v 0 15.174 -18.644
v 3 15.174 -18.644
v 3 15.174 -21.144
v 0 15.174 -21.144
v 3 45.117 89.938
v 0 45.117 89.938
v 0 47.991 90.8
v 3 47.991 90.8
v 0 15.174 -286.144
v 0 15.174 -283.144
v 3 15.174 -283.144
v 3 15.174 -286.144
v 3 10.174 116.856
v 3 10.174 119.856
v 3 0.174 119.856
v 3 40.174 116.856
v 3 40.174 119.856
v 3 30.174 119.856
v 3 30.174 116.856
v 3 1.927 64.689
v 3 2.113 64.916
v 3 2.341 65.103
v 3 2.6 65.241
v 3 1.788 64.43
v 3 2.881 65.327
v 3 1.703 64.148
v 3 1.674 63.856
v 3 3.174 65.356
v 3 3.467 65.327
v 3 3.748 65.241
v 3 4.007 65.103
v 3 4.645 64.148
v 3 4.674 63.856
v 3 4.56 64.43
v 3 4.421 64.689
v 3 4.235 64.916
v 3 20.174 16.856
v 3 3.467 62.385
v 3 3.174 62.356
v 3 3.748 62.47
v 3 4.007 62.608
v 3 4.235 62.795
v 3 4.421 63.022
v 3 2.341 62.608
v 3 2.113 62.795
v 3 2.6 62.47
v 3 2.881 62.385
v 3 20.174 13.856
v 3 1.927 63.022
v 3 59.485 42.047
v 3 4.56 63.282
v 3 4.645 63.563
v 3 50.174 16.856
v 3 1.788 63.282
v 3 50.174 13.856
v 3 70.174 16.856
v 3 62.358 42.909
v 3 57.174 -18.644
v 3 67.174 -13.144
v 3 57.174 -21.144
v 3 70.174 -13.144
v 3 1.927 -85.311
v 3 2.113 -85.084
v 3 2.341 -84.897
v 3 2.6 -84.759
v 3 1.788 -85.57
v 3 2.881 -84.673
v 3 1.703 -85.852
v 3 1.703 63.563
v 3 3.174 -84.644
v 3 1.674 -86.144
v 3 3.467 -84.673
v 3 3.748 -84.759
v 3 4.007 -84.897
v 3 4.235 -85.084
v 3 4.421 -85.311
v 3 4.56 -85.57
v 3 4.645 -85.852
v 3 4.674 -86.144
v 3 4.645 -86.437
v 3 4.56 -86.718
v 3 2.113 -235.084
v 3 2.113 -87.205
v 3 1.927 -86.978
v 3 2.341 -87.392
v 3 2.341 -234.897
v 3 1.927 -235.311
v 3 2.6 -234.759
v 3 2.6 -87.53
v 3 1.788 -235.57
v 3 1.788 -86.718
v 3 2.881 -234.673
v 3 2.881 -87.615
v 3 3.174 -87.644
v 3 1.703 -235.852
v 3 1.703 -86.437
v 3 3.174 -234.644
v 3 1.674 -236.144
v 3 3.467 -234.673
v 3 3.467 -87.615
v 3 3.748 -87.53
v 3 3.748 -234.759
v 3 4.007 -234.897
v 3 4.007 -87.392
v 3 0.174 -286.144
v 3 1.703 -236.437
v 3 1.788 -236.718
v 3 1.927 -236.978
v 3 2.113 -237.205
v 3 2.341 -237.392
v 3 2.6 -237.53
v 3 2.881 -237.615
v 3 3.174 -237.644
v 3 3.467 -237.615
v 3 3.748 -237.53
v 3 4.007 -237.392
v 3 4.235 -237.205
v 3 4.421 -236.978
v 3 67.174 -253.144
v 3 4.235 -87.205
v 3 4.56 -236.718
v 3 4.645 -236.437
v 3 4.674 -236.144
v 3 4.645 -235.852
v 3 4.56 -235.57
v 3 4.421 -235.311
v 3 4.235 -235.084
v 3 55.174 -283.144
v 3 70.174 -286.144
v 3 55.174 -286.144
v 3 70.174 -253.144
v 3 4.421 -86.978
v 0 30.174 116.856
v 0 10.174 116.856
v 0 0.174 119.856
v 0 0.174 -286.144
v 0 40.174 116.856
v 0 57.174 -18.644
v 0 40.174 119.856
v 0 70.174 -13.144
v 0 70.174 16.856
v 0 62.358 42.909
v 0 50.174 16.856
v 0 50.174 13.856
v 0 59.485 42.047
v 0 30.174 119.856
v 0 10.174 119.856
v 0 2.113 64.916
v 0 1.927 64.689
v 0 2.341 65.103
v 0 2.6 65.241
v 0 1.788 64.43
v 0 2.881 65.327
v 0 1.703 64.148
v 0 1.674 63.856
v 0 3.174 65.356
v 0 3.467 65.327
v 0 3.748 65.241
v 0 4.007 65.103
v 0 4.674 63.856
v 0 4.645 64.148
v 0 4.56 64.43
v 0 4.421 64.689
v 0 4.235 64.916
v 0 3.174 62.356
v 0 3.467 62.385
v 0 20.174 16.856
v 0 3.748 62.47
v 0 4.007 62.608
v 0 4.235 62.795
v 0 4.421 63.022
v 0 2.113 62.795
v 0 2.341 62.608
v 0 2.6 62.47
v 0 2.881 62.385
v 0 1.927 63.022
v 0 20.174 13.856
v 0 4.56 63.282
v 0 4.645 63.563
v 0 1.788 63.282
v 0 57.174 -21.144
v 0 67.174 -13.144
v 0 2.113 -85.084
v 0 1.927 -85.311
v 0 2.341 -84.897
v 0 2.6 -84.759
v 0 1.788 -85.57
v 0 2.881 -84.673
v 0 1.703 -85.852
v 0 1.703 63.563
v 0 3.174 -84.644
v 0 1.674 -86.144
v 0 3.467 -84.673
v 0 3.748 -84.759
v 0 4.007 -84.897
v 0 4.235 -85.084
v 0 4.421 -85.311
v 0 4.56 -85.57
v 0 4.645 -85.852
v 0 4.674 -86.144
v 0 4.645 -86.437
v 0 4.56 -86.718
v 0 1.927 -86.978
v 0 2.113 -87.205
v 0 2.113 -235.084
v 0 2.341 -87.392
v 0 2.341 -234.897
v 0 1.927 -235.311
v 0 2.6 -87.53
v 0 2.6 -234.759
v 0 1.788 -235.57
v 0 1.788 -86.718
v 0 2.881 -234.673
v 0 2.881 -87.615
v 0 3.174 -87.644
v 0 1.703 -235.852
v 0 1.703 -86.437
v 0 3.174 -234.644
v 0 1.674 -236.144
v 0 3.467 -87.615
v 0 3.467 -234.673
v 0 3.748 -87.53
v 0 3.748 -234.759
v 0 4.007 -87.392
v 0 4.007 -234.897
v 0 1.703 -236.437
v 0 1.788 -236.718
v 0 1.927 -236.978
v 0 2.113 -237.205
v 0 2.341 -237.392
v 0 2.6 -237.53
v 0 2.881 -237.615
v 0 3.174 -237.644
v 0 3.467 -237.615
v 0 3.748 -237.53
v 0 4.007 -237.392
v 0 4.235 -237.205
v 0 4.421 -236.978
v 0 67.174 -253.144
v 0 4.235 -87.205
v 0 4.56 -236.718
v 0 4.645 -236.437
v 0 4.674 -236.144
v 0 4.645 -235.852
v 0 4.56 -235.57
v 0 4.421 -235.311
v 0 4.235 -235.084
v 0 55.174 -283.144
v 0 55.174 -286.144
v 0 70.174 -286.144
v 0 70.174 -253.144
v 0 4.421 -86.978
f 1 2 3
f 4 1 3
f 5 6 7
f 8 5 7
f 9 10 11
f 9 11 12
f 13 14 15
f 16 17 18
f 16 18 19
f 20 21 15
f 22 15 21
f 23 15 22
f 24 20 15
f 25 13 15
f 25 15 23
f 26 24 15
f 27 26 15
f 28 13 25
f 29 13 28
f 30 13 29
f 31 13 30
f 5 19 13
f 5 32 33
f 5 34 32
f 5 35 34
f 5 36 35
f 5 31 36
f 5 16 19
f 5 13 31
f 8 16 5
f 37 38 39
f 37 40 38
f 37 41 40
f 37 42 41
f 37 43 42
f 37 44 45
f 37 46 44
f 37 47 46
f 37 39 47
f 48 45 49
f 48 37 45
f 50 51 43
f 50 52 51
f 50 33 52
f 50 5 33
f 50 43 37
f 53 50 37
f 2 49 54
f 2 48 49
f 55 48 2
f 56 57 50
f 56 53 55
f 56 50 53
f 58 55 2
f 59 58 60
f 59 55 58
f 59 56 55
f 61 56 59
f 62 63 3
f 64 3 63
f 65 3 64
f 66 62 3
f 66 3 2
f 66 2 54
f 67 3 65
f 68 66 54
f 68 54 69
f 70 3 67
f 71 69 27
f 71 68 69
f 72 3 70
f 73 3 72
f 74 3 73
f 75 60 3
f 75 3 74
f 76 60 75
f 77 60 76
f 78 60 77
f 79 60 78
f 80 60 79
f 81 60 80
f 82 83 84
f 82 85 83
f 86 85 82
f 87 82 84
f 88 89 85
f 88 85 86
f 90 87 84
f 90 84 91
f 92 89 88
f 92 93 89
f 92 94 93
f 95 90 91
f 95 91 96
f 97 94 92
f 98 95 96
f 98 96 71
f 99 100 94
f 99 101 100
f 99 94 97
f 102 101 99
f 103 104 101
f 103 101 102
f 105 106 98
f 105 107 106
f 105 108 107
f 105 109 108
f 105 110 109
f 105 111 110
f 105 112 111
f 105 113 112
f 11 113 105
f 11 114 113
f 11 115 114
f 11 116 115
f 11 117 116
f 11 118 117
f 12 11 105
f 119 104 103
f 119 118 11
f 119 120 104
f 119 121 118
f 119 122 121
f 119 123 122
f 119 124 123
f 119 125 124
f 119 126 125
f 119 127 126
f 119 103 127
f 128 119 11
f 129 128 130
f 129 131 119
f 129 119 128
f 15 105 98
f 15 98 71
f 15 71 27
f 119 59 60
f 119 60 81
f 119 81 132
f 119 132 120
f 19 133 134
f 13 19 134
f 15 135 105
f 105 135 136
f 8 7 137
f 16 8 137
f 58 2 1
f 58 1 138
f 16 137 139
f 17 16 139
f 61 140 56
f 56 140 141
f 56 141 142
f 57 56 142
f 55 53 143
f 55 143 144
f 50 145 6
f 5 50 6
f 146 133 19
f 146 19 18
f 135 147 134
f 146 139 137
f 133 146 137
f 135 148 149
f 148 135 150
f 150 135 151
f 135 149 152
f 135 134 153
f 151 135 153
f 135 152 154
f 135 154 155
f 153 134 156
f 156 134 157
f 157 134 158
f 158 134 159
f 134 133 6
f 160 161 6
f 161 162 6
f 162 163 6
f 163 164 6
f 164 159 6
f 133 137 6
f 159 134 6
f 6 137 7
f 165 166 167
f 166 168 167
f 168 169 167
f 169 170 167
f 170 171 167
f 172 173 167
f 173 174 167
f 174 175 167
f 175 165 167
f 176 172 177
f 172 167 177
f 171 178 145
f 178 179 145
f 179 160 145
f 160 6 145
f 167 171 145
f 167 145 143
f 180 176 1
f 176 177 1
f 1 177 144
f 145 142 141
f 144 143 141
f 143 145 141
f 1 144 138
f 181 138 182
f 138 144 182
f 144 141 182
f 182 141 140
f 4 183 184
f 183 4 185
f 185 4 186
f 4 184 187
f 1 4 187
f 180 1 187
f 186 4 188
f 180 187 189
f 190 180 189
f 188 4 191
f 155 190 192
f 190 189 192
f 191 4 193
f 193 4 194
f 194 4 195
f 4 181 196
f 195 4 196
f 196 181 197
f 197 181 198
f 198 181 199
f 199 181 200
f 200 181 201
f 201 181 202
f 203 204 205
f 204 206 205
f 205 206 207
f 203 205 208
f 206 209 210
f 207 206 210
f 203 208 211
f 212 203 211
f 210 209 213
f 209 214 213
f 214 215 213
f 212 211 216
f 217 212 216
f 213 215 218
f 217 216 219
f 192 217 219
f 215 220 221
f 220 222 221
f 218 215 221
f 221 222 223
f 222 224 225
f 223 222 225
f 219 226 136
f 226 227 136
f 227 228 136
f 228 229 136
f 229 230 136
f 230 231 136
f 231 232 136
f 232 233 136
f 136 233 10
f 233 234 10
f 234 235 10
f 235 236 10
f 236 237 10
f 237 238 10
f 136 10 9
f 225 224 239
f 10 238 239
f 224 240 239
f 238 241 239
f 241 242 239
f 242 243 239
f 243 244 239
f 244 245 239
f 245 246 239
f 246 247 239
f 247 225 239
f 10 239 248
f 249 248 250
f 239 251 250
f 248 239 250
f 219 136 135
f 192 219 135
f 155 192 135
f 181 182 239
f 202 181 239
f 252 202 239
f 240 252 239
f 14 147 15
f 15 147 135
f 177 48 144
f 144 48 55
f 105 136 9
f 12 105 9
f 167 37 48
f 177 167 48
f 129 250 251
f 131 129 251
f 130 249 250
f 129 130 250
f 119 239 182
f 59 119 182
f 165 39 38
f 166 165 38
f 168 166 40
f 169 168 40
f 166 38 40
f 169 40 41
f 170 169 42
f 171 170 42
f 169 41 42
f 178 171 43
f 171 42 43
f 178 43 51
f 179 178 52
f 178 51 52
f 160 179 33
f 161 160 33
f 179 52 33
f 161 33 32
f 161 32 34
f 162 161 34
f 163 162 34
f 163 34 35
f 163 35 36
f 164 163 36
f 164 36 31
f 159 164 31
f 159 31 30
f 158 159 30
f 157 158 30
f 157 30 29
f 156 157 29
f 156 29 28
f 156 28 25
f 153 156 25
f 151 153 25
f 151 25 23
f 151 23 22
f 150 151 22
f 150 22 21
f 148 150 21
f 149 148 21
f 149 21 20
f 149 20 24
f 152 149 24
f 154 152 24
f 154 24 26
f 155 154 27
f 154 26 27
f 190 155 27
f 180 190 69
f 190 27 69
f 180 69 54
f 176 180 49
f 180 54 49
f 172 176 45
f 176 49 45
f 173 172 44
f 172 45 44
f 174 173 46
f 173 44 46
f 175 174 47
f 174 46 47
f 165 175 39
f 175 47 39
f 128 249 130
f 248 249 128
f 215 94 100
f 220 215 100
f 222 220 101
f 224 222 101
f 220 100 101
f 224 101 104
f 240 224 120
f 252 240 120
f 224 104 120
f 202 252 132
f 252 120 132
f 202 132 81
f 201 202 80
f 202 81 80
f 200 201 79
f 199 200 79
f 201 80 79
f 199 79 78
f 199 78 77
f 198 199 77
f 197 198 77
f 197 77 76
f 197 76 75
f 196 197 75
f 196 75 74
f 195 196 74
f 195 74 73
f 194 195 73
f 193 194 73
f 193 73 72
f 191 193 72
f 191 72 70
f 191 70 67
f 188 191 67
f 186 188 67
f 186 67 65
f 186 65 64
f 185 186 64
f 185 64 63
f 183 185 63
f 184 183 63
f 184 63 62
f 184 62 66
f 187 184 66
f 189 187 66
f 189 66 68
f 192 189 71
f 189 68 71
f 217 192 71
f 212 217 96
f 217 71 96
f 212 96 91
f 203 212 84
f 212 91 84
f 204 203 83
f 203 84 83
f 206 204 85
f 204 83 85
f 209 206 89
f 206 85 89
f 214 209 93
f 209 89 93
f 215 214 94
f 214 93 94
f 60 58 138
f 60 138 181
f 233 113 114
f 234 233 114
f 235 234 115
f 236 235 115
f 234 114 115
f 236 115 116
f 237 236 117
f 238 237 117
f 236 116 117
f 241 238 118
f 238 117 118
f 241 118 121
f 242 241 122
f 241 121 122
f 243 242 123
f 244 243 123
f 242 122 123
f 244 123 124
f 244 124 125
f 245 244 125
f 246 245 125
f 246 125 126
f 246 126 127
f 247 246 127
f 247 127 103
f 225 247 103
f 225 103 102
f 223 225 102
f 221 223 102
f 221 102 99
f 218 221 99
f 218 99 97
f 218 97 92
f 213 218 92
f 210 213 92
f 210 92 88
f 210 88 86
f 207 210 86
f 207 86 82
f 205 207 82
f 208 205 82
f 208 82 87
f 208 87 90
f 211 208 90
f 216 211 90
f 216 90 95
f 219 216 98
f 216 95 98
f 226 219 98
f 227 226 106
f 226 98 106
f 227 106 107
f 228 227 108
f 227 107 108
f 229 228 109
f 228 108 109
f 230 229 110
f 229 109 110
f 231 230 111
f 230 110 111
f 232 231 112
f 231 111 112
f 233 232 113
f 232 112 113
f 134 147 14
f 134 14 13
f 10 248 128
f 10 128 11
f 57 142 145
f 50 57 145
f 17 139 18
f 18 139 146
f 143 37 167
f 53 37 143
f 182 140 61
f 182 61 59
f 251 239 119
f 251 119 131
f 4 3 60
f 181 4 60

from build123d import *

# Parameters (mm, degrees)
BOSS_EXTRUDE1_DEPTH      = 3
CUT_EXTRUDE2_DEPTH       = 295.638673234
CUT_EXTRUDE2_DEPTH_BACK  = 3
CUT_EXTRUDE6_DEPTH       = 295.638673234
CUT_EXTRUDE6_DEPTH_BACK  = 3
CUT_EXTRUDE11_DEPTH      = 295.638673234
CUT_EXTRUDE11_DEPTH_BACK = 3
CUT_EXTRUDE12_DEPTH      = 295.638673234
CUT_EXTRUDE12_DEPTH_BACK = 3
SKETCH9_W                = 3
SKETCH9_H                = 30
CUT_EXTRUDE13_DEPTH      = 3
SKETCH10_W               = 2.5
SKETCH10_H               = 42
CUT_EXTRUDE14_DEPTH      = 10
SKETCH11_R               = 1.5
CUT_EXTRUDE15_DEPTH      = 10


with BuildPart() as part:
    # Sketch1 → Boss-Extrude1 (new body)
    with BuildSketch(Plane(origin=(0, 0, 0), x_dir=(0, 0, -1), z_dir=(1, 0, 0))):
        Polygon((286.144320394, 0.17389594), (286.144320394, 70.17389594), (-16.855679606, 70.17389594), (-116.855679606, 40.17389594), (-119.855679606, 40.17389594), (-119.855679606, 0.17389594), align=None)
    extrude(amount=BOSS_EXTRUDE1_DEPTH)

    # Sketch5 → Cut-Extrude2 (cut, two sides: drawn at the far end of the back side and taken through both)
    with BuildSketch(Plane(origin=(3, 0, 0), x_dir=(0, 0, -1), z_dir=(1, 0, 0)).offset(-CUT_EXTRUDE2_DEPTH_BACK)):
        Polygon((1115.56118622, 55.17389594), (286.144320394, 55.17389594), (283.144320394, 55.17389594), (283.144320394, 15.17389594), (286.144320394, 15.17389594), (1115.56118622, 15.17389594), (2774.394917872, 15.17389594), (2774.394917872, 55.17389594), align=None)
    extrude(amount=CUT_EXTRUDE2_DEPTH + CUT_EXTRUDE2_DEPTH_BACK, mode=Mode.SUBTRACT)

    # Sketch6 → Cut-Extrude6 (cut, two sides: drawn at the far end of the back side and taken through both)
    with BuildSketch(Plane(origin=(3, 0, 0), x_dir=(0, 0, -1), z_dir=(1, 0, 0)).offset(-CUT_EXTRUDE6_DEPTH_BACK)):
        Polygon((253.144320394, 839.196952243), (253.144320394, 70.17389594), (253.144320394, 67.17389594), (13.144320394, 67.17389594), (13.144320394, 70.17389594), (13.144320394, 839.196952243), (13.144320394, 2377.24306485), (253.144320394, 2377.24306485), align=None)
    extrude(amount=CUT_EXTRUDE6_DEPTH + CUT_EXTRUDE6_DEPTH_BACK, mode=Mode.SUBTRACT)

    # Sketch7 → Cut-Extrude11 (cut, two sides: drawn at the far end of the back side and taken through both)
    with BuildSketch(Plane(origin=(3, 0, 0), x_dir=(0, 0, -1), z_dir=(1, 0, 0)).offset(-CUT_EXTRUDE11_DEPTH_BACK)):
        Polygon((-264.146282978, 799.817128167), (-42.908554564, 62.358033452), (-42.046510907, 59.484554597), (-89.937825168, 45.117160318), (-90.799868825, 47.990639174), (-312.037597239, 785.449733889), (-754.513054068, 2260.367923318), (-706.621739807, 2274.735317597), align=None)
    extrude(amount=CUT_EXTRUDE11_DEPTH + CUT_EXTRUDE11_DEPTH_BACK, mode=Mode.SUBTRACT)

    # Sketch8 → Cut-Extrude12 (cut, two sides: drawn at the far end of the back side and taken through both)
    with BuildSketch(Plane(origin=(3, 0, 0), x_dir=(0, 0, -1), z_dir=(1, 0, 0)).offset(-CUT_EXTRUDE12_DEPTH_BACK)):
        Polygon((-950.674782697, 30.17389594), (-119.855679606, 30.17389594), (-116.855679606, 30.17389594), (-116.855679606, 10.17389594), (-119.855679606, 10.17389594), (-950.674782697, 10.17389594), (-2612.31298888, 10.17389594), (-2612.31298888, 30.17389594), align=None)
    extrude(amount=CUT_EXTRUDE12_DEPTH + CUT_EXTRUDE12_DEPTH_BACK, mode=Mode.SUBTRACT)

    # Sketch9 → Cut-Extrude13 (cut)
    with BuildSketch(Plane(origin=(3, 0, 0), x_dir=(0, 0, -1), z_dir=(1, 0, 0))):
        with Locations((-15.355679606, 35.17389594)):
            Rectangle(SKETCH9_W, SKETCH9_H)
    extrude(amount=-CUT_EXTRUDE13_DEPTH, mode=Mode.SUBTRACT)

    # Sketch10 → Cut-Extrude14 (cut)
    with BuildSketch(Plane(origin=(3, 0, 0), x_dir=(0, 0, -1), z_dir=(1, 0, 0))):
        with Locations((19.894320394, 36.17389594)):
            Rectangle(SKETCH10_W, SKETCH10_H)
    extrude(amount=-CUT_EXTRUDE14_DEPTH, mode=Mode.SUBTRACT)

    # Sketch11 → Cut-Extrude15 (cut)
    with BuildSketch(Plane(origin=(3, 0, 0), x_dir=(0, 0, -1), z_dir=(1, 0, 0))):
        with Locations((236.144320394, 3.17389594)):
            Circle(SKETCH11_R)
        with Locations((86.144320394, 3.17389594)):
            Circle(SKETCH11_R)
        with Locations((-63.855679606, 3.17389594)):
            Circle(SKETCH11_R)
    extrude(amount=-CUT_EXTRUDE15_DEPTH, mode=Mode.SUBTRACT)


solid = part.part
